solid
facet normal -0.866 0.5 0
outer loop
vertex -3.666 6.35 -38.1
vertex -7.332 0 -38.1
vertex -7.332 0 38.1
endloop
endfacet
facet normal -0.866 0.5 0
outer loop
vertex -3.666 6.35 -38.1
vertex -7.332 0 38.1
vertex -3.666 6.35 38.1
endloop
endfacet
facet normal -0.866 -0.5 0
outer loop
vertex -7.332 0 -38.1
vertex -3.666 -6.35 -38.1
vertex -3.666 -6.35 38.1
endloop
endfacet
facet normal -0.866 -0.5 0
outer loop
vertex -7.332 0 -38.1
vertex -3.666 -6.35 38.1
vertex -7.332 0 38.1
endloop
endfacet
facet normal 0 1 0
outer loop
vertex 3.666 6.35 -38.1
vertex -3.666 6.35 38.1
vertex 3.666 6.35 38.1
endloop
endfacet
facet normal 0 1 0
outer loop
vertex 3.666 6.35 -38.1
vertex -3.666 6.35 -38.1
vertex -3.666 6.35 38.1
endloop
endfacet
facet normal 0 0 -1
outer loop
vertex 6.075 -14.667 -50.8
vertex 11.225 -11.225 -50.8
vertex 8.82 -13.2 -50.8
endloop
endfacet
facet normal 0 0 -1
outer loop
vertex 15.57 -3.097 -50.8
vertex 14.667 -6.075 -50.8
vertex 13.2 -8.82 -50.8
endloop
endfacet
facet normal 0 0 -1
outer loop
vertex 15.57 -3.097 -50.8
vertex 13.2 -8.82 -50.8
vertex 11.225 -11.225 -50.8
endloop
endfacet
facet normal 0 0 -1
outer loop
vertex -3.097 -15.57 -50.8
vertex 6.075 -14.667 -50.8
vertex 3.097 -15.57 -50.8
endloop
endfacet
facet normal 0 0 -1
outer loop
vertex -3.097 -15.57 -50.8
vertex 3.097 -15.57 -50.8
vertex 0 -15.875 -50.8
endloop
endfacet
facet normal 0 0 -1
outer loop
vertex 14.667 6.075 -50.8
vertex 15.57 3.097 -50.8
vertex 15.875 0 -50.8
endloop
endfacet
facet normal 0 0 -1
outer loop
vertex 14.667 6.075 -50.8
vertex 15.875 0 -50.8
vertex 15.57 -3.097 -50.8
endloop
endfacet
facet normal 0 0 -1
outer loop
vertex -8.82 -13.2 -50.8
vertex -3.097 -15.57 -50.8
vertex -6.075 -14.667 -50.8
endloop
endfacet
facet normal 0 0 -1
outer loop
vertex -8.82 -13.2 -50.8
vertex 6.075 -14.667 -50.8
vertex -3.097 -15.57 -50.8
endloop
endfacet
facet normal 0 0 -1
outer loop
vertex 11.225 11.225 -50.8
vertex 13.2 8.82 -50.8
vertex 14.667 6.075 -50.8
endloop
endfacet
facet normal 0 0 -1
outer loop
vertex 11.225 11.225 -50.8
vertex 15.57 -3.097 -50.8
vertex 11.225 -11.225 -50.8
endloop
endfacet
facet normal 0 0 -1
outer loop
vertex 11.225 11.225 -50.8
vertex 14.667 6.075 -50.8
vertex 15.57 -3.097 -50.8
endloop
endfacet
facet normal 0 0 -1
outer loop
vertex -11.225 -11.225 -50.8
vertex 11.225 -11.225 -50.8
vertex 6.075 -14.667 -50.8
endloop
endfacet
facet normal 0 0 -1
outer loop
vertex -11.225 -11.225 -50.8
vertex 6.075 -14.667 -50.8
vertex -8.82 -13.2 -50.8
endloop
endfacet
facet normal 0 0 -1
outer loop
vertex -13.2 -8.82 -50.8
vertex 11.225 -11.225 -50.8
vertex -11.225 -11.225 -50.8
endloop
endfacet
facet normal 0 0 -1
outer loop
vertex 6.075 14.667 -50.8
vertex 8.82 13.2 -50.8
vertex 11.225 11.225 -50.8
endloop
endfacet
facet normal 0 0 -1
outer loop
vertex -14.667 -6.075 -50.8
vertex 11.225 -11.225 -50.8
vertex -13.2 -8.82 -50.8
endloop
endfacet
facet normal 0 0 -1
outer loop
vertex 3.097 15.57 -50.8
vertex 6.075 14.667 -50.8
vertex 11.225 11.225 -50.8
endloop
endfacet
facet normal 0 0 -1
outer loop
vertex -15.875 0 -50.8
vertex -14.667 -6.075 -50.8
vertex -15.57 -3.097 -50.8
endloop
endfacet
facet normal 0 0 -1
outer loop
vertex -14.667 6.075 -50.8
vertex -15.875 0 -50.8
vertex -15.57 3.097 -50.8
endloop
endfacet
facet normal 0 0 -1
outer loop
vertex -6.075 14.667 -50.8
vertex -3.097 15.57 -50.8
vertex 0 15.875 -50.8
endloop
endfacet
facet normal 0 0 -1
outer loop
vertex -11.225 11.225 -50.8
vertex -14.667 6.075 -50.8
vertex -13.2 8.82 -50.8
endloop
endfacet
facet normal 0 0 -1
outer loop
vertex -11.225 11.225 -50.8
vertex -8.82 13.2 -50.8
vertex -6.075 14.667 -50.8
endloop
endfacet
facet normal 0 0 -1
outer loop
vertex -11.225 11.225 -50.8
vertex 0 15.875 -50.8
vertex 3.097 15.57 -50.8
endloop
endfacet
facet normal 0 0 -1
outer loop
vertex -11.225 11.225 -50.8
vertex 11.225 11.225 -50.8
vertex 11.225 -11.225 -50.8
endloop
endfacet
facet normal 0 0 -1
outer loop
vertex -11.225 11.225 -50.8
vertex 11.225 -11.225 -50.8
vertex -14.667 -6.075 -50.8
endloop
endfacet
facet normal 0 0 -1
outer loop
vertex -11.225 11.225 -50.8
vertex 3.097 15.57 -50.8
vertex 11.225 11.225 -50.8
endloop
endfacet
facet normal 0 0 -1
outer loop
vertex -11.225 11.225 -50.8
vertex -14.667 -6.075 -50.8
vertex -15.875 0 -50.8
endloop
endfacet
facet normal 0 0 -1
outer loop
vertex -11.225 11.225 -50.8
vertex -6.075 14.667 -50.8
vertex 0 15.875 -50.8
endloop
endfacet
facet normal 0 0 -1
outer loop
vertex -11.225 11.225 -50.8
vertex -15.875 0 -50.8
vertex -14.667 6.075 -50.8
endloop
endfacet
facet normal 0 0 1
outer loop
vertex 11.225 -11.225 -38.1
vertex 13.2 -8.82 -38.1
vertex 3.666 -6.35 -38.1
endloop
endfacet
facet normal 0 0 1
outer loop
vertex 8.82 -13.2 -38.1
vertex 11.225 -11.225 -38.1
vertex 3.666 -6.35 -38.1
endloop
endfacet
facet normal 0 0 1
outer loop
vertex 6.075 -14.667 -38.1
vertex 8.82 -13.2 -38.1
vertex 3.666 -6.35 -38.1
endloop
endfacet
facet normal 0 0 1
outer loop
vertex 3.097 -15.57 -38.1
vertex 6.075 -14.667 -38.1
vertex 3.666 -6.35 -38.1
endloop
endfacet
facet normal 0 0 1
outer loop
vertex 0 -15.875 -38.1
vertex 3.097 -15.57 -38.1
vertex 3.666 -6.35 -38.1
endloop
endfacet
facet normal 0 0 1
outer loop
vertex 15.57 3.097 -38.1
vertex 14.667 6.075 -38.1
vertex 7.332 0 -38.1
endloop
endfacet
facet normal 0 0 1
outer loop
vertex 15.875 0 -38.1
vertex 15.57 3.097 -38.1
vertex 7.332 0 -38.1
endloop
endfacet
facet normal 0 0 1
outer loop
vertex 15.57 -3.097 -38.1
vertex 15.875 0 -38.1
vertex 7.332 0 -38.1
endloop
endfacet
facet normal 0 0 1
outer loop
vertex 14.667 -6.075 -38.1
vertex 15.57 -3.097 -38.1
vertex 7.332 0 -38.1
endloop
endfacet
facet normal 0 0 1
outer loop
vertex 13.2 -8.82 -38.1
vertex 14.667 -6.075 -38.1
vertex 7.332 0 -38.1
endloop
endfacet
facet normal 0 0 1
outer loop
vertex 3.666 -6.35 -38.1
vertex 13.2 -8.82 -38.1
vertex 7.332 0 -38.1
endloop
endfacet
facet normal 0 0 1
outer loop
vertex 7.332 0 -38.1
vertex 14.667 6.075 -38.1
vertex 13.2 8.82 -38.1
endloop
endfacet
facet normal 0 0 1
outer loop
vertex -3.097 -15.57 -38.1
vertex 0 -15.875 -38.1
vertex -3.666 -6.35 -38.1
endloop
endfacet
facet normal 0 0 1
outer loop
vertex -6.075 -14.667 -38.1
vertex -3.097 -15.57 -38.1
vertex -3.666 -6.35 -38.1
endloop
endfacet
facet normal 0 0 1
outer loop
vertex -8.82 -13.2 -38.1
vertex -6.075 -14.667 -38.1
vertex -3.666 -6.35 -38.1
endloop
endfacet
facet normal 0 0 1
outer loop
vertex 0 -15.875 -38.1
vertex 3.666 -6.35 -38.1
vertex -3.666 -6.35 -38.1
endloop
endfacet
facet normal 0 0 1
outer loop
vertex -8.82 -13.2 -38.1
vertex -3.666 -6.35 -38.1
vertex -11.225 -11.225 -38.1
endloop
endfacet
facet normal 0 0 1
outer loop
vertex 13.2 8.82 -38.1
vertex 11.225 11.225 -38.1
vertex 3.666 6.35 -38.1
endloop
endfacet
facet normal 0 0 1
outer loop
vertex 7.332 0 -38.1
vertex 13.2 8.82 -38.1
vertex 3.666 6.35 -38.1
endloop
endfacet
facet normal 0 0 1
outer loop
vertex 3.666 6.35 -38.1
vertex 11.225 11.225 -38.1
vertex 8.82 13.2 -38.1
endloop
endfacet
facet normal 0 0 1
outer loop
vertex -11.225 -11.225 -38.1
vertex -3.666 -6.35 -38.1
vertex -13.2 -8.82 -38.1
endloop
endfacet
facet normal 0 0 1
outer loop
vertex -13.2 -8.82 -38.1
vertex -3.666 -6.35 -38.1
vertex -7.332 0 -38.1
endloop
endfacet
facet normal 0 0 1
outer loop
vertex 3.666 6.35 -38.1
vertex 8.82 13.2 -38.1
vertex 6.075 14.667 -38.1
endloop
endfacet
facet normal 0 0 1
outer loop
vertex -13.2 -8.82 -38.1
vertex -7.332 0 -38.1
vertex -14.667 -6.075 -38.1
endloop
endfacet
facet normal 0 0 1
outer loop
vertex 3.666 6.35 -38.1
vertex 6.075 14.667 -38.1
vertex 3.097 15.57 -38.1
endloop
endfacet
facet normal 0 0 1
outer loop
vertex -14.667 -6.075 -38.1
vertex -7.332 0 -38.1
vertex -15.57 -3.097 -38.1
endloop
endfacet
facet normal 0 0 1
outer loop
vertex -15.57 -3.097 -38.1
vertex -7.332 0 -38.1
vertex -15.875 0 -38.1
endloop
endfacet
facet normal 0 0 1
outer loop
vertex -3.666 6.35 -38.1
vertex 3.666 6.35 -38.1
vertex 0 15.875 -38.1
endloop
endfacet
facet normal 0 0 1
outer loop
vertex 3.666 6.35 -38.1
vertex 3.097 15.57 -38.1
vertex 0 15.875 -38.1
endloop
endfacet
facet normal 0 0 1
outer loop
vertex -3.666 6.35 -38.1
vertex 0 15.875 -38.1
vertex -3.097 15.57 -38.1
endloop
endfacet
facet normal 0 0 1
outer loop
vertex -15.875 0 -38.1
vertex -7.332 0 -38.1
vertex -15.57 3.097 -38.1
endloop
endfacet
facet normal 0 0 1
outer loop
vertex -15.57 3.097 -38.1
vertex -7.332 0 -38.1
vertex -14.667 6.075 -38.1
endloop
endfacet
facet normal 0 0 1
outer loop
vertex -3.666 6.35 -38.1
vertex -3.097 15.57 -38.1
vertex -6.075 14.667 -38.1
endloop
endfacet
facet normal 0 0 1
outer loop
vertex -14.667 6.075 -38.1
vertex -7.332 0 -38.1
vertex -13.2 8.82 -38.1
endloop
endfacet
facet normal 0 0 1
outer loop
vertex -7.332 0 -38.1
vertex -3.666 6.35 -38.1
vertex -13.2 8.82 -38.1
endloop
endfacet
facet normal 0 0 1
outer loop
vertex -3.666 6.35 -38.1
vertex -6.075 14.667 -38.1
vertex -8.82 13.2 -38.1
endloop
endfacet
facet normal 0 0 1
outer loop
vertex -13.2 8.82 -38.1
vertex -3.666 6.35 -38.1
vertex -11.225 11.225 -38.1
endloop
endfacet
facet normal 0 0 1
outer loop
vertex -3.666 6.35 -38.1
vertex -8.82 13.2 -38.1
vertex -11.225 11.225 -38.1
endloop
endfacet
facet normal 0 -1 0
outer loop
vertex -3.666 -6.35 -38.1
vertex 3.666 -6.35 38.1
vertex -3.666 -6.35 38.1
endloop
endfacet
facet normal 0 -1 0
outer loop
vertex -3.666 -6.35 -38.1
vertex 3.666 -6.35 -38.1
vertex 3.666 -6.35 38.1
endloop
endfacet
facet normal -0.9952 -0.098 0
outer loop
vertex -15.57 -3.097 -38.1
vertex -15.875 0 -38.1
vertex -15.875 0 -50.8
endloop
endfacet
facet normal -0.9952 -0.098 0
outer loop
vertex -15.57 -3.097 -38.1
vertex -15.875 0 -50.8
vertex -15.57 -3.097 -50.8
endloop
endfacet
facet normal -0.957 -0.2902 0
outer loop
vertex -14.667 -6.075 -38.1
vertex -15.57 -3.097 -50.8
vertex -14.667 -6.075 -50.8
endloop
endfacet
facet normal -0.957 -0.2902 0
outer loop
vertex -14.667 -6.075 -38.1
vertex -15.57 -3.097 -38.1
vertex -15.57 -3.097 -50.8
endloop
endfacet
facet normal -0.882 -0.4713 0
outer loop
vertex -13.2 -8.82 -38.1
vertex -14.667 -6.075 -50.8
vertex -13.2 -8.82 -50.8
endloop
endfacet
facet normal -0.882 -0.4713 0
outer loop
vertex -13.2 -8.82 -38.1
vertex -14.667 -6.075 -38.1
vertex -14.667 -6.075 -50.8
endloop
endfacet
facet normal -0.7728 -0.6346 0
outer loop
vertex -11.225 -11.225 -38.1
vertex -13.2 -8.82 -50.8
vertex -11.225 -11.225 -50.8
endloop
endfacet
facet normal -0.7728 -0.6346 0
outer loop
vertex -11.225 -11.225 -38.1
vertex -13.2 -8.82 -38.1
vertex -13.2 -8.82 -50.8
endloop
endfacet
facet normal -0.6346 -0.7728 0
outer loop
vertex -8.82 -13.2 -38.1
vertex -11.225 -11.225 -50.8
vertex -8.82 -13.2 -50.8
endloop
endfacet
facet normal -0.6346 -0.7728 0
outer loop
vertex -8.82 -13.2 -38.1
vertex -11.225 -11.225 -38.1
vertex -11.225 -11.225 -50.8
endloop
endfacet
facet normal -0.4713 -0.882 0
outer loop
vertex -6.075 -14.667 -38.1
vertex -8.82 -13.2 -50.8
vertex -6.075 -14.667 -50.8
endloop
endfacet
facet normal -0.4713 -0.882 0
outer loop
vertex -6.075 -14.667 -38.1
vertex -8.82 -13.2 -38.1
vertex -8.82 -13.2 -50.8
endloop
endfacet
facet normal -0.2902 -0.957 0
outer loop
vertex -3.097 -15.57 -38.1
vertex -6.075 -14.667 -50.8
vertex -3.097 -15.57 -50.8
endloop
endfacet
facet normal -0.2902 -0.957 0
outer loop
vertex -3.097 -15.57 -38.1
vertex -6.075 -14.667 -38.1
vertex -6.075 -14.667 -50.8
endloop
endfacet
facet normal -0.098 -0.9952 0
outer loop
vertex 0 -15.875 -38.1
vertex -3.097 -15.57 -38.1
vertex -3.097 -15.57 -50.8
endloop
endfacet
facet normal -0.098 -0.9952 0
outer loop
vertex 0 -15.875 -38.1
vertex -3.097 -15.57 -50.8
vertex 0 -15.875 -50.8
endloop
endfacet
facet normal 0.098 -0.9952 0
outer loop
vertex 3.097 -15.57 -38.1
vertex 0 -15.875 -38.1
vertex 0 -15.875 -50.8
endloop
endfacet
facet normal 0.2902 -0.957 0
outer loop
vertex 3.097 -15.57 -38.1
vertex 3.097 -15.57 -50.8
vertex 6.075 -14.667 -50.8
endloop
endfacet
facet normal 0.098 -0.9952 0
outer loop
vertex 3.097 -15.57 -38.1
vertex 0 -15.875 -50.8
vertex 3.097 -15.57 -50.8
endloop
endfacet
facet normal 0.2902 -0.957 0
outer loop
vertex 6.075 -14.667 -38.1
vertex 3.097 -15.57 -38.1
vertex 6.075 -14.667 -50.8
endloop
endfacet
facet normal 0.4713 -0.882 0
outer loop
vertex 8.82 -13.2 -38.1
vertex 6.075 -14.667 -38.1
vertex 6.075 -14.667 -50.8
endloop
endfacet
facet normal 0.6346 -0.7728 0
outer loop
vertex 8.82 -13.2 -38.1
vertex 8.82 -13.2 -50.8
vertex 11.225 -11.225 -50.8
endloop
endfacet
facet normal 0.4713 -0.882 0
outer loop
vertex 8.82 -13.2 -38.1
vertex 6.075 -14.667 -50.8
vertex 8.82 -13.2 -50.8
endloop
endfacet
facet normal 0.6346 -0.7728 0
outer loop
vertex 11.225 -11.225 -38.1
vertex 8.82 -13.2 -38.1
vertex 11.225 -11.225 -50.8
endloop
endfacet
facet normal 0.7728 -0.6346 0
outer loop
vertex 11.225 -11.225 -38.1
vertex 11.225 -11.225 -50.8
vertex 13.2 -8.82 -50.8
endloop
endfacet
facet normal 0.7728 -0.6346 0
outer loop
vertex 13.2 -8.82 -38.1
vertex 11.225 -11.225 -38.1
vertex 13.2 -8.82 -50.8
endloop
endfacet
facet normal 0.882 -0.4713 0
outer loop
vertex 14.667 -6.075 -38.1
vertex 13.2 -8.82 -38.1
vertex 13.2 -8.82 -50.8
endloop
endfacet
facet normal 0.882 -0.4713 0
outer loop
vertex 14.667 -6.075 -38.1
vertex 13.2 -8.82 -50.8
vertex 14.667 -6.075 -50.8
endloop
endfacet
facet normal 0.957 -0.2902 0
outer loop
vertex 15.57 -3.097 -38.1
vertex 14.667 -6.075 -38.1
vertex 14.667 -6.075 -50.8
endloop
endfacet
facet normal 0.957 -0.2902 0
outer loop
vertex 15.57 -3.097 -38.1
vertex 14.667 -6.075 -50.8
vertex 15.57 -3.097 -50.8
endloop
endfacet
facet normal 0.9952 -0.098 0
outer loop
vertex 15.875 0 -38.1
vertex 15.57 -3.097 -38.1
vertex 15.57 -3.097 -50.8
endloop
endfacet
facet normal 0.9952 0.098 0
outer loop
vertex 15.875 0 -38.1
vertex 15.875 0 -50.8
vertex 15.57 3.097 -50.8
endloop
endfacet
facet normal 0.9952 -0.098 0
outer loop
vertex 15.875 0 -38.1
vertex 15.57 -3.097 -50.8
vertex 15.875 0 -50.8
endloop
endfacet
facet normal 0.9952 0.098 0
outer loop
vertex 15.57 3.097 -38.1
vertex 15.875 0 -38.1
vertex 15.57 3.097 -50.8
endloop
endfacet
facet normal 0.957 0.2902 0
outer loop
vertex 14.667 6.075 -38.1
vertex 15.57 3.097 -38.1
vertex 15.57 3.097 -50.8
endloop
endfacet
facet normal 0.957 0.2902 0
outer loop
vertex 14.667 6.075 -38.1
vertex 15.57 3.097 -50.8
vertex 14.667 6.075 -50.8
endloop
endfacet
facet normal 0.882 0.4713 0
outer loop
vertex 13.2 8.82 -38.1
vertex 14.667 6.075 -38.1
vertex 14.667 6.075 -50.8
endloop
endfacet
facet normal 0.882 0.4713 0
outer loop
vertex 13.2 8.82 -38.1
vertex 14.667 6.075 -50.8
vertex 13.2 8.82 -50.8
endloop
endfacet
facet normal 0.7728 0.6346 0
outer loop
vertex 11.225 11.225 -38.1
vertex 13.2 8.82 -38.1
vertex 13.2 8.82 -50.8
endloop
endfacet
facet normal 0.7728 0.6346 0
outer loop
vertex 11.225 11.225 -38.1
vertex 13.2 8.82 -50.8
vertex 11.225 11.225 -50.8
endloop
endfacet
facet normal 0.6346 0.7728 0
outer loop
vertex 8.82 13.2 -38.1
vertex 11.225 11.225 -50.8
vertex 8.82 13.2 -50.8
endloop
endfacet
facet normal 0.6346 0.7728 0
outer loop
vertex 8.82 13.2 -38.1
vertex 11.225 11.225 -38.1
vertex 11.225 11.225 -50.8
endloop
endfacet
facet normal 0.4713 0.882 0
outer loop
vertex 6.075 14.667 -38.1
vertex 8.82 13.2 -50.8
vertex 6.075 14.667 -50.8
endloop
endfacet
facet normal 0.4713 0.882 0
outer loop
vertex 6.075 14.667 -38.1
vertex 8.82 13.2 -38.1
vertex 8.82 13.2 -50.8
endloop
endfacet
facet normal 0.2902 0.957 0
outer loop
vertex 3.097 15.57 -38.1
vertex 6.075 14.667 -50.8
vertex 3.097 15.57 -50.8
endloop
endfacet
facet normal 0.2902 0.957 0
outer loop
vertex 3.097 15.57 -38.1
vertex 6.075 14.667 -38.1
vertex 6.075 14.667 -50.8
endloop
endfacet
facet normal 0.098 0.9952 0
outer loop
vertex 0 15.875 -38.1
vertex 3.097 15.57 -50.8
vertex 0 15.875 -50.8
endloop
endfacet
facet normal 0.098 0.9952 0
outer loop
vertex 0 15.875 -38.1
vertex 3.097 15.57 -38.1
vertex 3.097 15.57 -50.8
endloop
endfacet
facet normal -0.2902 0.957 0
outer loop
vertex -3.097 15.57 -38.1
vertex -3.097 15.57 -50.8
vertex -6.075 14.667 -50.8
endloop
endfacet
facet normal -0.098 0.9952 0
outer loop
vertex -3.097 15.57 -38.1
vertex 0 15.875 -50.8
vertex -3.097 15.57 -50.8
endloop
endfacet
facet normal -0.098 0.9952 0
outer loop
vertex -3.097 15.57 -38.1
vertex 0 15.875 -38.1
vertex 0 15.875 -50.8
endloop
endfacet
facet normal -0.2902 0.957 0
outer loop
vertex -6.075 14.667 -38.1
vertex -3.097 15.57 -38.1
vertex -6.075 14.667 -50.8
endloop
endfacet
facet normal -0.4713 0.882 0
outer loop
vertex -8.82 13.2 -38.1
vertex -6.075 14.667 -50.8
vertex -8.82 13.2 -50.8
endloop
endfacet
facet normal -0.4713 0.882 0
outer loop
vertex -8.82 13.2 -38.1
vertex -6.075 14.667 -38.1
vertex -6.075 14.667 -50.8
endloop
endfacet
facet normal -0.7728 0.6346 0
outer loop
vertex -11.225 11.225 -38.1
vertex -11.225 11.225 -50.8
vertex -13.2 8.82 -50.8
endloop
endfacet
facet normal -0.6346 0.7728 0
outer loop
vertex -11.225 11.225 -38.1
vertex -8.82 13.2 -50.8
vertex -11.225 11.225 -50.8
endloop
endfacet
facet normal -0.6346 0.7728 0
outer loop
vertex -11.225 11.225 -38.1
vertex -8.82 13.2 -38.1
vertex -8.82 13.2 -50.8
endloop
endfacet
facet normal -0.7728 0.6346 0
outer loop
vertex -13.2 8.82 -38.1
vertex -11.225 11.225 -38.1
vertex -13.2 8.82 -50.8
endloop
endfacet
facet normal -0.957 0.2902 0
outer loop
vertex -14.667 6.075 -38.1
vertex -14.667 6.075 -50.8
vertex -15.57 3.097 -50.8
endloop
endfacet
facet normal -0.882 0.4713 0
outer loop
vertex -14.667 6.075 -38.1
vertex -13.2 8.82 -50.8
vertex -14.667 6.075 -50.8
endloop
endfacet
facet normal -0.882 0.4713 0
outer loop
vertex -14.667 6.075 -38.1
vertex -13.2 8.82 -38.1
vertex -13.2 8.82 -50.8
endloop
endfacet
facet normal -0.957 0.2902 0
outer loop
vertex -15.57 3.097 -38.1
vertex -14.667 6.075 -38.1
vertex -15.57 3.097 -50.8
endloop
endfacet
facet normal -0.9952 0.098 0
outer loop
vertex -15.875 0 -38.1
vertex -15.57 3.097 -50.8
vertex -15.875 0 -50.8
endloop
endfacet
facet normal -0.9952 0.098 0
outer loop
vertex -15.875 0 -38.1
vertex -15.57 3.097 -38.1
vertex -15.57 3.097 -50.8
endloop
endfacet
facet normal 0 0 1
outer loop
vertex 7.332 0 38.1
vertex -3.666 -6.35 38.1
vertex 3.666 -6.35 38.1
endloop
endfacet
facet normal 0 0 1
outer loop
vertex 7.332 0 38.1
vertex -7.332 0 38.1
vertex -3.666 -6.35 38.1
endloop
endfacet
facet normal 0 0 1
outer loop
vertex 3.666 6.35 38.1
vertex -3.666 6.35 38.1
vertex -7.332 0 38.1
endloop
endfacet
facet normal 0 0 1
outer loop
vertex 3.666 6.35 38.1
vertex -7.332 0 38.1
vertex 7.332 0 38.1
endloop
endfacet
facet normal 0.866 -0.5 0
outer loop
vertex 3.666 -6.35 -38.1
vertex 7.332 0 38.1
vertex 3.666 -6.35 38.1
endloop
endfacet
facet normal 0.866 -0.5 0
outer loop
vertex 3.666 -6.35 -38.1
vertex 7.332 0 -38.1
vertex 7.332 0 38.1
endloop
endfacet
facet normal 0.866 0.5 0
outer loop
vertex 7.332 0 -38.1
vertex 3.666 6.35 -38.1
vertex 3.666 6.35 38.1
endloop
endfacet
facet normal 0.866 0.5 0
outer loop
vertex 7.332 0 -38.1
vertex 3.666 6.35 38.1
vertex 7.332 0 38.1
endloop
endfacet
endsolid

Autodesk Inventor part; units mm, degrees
ref_plane "YZ Plane" through (0, 0, 0) normal (1, 0, 0) x (0, 1, 0)
ref_plane "XZ Plane" through (0, 0, 0) normal (0, 1, 0) x (-1, 0, 0)
ref_plane "XY Plane" through (0, 0, 0) normal (0, 0, 1) x (1, 0, 0)
sketch "Sketch1" plane through (0, 0, 0) normal (0, 0, 1) x (1, 0, 0)
  line L0 (7.3323, 0) -> (3.6662, -6.35)
  line L1 (3.6662, -6.35) -> (-3.6662, -6.35)
  line L2 (-3.6662, -6.35) -> (-7.3323, 0)
  line L3 (-7.3323, 0) -> (-3.6662, 6.35)
  line L4 (-3.6662, 6.35) -> (3.6662, 6.35)
  line L5 (3.6662, 6.35) -> (7.3323, 0)
  point P0 (0, 0)
  point P1 (0, 0)
  dimension "d0" = 12.7
extrude "Extrusion1" add sketch "Sketch1" along normal mid plane 76.2
sketch "Sketch2" plane through (0, 0, -38.1) normal (0, 0, -1) x (-1, 0, 0)
  circle A0 centre (0, 0) radius 15.875
  dimension "d3" = 31.75
extrude "Extrusion2" add sketch "Sketch2" along normal blind 12.7
equation "\"d0\" = printedHexSize"
equation "\"d1\" = length"
equation "\"hexSize\" = 12.7"
equation "\"slipFitOffset\" = 0"
equation "\"printedHexSize\" = hexSize - slipFitOffset"
equation "\"length\" = 76.2"
properties part number "1_2-inchHexX1_2x1_2Bushingt" material "PC/ABS Plastic"
